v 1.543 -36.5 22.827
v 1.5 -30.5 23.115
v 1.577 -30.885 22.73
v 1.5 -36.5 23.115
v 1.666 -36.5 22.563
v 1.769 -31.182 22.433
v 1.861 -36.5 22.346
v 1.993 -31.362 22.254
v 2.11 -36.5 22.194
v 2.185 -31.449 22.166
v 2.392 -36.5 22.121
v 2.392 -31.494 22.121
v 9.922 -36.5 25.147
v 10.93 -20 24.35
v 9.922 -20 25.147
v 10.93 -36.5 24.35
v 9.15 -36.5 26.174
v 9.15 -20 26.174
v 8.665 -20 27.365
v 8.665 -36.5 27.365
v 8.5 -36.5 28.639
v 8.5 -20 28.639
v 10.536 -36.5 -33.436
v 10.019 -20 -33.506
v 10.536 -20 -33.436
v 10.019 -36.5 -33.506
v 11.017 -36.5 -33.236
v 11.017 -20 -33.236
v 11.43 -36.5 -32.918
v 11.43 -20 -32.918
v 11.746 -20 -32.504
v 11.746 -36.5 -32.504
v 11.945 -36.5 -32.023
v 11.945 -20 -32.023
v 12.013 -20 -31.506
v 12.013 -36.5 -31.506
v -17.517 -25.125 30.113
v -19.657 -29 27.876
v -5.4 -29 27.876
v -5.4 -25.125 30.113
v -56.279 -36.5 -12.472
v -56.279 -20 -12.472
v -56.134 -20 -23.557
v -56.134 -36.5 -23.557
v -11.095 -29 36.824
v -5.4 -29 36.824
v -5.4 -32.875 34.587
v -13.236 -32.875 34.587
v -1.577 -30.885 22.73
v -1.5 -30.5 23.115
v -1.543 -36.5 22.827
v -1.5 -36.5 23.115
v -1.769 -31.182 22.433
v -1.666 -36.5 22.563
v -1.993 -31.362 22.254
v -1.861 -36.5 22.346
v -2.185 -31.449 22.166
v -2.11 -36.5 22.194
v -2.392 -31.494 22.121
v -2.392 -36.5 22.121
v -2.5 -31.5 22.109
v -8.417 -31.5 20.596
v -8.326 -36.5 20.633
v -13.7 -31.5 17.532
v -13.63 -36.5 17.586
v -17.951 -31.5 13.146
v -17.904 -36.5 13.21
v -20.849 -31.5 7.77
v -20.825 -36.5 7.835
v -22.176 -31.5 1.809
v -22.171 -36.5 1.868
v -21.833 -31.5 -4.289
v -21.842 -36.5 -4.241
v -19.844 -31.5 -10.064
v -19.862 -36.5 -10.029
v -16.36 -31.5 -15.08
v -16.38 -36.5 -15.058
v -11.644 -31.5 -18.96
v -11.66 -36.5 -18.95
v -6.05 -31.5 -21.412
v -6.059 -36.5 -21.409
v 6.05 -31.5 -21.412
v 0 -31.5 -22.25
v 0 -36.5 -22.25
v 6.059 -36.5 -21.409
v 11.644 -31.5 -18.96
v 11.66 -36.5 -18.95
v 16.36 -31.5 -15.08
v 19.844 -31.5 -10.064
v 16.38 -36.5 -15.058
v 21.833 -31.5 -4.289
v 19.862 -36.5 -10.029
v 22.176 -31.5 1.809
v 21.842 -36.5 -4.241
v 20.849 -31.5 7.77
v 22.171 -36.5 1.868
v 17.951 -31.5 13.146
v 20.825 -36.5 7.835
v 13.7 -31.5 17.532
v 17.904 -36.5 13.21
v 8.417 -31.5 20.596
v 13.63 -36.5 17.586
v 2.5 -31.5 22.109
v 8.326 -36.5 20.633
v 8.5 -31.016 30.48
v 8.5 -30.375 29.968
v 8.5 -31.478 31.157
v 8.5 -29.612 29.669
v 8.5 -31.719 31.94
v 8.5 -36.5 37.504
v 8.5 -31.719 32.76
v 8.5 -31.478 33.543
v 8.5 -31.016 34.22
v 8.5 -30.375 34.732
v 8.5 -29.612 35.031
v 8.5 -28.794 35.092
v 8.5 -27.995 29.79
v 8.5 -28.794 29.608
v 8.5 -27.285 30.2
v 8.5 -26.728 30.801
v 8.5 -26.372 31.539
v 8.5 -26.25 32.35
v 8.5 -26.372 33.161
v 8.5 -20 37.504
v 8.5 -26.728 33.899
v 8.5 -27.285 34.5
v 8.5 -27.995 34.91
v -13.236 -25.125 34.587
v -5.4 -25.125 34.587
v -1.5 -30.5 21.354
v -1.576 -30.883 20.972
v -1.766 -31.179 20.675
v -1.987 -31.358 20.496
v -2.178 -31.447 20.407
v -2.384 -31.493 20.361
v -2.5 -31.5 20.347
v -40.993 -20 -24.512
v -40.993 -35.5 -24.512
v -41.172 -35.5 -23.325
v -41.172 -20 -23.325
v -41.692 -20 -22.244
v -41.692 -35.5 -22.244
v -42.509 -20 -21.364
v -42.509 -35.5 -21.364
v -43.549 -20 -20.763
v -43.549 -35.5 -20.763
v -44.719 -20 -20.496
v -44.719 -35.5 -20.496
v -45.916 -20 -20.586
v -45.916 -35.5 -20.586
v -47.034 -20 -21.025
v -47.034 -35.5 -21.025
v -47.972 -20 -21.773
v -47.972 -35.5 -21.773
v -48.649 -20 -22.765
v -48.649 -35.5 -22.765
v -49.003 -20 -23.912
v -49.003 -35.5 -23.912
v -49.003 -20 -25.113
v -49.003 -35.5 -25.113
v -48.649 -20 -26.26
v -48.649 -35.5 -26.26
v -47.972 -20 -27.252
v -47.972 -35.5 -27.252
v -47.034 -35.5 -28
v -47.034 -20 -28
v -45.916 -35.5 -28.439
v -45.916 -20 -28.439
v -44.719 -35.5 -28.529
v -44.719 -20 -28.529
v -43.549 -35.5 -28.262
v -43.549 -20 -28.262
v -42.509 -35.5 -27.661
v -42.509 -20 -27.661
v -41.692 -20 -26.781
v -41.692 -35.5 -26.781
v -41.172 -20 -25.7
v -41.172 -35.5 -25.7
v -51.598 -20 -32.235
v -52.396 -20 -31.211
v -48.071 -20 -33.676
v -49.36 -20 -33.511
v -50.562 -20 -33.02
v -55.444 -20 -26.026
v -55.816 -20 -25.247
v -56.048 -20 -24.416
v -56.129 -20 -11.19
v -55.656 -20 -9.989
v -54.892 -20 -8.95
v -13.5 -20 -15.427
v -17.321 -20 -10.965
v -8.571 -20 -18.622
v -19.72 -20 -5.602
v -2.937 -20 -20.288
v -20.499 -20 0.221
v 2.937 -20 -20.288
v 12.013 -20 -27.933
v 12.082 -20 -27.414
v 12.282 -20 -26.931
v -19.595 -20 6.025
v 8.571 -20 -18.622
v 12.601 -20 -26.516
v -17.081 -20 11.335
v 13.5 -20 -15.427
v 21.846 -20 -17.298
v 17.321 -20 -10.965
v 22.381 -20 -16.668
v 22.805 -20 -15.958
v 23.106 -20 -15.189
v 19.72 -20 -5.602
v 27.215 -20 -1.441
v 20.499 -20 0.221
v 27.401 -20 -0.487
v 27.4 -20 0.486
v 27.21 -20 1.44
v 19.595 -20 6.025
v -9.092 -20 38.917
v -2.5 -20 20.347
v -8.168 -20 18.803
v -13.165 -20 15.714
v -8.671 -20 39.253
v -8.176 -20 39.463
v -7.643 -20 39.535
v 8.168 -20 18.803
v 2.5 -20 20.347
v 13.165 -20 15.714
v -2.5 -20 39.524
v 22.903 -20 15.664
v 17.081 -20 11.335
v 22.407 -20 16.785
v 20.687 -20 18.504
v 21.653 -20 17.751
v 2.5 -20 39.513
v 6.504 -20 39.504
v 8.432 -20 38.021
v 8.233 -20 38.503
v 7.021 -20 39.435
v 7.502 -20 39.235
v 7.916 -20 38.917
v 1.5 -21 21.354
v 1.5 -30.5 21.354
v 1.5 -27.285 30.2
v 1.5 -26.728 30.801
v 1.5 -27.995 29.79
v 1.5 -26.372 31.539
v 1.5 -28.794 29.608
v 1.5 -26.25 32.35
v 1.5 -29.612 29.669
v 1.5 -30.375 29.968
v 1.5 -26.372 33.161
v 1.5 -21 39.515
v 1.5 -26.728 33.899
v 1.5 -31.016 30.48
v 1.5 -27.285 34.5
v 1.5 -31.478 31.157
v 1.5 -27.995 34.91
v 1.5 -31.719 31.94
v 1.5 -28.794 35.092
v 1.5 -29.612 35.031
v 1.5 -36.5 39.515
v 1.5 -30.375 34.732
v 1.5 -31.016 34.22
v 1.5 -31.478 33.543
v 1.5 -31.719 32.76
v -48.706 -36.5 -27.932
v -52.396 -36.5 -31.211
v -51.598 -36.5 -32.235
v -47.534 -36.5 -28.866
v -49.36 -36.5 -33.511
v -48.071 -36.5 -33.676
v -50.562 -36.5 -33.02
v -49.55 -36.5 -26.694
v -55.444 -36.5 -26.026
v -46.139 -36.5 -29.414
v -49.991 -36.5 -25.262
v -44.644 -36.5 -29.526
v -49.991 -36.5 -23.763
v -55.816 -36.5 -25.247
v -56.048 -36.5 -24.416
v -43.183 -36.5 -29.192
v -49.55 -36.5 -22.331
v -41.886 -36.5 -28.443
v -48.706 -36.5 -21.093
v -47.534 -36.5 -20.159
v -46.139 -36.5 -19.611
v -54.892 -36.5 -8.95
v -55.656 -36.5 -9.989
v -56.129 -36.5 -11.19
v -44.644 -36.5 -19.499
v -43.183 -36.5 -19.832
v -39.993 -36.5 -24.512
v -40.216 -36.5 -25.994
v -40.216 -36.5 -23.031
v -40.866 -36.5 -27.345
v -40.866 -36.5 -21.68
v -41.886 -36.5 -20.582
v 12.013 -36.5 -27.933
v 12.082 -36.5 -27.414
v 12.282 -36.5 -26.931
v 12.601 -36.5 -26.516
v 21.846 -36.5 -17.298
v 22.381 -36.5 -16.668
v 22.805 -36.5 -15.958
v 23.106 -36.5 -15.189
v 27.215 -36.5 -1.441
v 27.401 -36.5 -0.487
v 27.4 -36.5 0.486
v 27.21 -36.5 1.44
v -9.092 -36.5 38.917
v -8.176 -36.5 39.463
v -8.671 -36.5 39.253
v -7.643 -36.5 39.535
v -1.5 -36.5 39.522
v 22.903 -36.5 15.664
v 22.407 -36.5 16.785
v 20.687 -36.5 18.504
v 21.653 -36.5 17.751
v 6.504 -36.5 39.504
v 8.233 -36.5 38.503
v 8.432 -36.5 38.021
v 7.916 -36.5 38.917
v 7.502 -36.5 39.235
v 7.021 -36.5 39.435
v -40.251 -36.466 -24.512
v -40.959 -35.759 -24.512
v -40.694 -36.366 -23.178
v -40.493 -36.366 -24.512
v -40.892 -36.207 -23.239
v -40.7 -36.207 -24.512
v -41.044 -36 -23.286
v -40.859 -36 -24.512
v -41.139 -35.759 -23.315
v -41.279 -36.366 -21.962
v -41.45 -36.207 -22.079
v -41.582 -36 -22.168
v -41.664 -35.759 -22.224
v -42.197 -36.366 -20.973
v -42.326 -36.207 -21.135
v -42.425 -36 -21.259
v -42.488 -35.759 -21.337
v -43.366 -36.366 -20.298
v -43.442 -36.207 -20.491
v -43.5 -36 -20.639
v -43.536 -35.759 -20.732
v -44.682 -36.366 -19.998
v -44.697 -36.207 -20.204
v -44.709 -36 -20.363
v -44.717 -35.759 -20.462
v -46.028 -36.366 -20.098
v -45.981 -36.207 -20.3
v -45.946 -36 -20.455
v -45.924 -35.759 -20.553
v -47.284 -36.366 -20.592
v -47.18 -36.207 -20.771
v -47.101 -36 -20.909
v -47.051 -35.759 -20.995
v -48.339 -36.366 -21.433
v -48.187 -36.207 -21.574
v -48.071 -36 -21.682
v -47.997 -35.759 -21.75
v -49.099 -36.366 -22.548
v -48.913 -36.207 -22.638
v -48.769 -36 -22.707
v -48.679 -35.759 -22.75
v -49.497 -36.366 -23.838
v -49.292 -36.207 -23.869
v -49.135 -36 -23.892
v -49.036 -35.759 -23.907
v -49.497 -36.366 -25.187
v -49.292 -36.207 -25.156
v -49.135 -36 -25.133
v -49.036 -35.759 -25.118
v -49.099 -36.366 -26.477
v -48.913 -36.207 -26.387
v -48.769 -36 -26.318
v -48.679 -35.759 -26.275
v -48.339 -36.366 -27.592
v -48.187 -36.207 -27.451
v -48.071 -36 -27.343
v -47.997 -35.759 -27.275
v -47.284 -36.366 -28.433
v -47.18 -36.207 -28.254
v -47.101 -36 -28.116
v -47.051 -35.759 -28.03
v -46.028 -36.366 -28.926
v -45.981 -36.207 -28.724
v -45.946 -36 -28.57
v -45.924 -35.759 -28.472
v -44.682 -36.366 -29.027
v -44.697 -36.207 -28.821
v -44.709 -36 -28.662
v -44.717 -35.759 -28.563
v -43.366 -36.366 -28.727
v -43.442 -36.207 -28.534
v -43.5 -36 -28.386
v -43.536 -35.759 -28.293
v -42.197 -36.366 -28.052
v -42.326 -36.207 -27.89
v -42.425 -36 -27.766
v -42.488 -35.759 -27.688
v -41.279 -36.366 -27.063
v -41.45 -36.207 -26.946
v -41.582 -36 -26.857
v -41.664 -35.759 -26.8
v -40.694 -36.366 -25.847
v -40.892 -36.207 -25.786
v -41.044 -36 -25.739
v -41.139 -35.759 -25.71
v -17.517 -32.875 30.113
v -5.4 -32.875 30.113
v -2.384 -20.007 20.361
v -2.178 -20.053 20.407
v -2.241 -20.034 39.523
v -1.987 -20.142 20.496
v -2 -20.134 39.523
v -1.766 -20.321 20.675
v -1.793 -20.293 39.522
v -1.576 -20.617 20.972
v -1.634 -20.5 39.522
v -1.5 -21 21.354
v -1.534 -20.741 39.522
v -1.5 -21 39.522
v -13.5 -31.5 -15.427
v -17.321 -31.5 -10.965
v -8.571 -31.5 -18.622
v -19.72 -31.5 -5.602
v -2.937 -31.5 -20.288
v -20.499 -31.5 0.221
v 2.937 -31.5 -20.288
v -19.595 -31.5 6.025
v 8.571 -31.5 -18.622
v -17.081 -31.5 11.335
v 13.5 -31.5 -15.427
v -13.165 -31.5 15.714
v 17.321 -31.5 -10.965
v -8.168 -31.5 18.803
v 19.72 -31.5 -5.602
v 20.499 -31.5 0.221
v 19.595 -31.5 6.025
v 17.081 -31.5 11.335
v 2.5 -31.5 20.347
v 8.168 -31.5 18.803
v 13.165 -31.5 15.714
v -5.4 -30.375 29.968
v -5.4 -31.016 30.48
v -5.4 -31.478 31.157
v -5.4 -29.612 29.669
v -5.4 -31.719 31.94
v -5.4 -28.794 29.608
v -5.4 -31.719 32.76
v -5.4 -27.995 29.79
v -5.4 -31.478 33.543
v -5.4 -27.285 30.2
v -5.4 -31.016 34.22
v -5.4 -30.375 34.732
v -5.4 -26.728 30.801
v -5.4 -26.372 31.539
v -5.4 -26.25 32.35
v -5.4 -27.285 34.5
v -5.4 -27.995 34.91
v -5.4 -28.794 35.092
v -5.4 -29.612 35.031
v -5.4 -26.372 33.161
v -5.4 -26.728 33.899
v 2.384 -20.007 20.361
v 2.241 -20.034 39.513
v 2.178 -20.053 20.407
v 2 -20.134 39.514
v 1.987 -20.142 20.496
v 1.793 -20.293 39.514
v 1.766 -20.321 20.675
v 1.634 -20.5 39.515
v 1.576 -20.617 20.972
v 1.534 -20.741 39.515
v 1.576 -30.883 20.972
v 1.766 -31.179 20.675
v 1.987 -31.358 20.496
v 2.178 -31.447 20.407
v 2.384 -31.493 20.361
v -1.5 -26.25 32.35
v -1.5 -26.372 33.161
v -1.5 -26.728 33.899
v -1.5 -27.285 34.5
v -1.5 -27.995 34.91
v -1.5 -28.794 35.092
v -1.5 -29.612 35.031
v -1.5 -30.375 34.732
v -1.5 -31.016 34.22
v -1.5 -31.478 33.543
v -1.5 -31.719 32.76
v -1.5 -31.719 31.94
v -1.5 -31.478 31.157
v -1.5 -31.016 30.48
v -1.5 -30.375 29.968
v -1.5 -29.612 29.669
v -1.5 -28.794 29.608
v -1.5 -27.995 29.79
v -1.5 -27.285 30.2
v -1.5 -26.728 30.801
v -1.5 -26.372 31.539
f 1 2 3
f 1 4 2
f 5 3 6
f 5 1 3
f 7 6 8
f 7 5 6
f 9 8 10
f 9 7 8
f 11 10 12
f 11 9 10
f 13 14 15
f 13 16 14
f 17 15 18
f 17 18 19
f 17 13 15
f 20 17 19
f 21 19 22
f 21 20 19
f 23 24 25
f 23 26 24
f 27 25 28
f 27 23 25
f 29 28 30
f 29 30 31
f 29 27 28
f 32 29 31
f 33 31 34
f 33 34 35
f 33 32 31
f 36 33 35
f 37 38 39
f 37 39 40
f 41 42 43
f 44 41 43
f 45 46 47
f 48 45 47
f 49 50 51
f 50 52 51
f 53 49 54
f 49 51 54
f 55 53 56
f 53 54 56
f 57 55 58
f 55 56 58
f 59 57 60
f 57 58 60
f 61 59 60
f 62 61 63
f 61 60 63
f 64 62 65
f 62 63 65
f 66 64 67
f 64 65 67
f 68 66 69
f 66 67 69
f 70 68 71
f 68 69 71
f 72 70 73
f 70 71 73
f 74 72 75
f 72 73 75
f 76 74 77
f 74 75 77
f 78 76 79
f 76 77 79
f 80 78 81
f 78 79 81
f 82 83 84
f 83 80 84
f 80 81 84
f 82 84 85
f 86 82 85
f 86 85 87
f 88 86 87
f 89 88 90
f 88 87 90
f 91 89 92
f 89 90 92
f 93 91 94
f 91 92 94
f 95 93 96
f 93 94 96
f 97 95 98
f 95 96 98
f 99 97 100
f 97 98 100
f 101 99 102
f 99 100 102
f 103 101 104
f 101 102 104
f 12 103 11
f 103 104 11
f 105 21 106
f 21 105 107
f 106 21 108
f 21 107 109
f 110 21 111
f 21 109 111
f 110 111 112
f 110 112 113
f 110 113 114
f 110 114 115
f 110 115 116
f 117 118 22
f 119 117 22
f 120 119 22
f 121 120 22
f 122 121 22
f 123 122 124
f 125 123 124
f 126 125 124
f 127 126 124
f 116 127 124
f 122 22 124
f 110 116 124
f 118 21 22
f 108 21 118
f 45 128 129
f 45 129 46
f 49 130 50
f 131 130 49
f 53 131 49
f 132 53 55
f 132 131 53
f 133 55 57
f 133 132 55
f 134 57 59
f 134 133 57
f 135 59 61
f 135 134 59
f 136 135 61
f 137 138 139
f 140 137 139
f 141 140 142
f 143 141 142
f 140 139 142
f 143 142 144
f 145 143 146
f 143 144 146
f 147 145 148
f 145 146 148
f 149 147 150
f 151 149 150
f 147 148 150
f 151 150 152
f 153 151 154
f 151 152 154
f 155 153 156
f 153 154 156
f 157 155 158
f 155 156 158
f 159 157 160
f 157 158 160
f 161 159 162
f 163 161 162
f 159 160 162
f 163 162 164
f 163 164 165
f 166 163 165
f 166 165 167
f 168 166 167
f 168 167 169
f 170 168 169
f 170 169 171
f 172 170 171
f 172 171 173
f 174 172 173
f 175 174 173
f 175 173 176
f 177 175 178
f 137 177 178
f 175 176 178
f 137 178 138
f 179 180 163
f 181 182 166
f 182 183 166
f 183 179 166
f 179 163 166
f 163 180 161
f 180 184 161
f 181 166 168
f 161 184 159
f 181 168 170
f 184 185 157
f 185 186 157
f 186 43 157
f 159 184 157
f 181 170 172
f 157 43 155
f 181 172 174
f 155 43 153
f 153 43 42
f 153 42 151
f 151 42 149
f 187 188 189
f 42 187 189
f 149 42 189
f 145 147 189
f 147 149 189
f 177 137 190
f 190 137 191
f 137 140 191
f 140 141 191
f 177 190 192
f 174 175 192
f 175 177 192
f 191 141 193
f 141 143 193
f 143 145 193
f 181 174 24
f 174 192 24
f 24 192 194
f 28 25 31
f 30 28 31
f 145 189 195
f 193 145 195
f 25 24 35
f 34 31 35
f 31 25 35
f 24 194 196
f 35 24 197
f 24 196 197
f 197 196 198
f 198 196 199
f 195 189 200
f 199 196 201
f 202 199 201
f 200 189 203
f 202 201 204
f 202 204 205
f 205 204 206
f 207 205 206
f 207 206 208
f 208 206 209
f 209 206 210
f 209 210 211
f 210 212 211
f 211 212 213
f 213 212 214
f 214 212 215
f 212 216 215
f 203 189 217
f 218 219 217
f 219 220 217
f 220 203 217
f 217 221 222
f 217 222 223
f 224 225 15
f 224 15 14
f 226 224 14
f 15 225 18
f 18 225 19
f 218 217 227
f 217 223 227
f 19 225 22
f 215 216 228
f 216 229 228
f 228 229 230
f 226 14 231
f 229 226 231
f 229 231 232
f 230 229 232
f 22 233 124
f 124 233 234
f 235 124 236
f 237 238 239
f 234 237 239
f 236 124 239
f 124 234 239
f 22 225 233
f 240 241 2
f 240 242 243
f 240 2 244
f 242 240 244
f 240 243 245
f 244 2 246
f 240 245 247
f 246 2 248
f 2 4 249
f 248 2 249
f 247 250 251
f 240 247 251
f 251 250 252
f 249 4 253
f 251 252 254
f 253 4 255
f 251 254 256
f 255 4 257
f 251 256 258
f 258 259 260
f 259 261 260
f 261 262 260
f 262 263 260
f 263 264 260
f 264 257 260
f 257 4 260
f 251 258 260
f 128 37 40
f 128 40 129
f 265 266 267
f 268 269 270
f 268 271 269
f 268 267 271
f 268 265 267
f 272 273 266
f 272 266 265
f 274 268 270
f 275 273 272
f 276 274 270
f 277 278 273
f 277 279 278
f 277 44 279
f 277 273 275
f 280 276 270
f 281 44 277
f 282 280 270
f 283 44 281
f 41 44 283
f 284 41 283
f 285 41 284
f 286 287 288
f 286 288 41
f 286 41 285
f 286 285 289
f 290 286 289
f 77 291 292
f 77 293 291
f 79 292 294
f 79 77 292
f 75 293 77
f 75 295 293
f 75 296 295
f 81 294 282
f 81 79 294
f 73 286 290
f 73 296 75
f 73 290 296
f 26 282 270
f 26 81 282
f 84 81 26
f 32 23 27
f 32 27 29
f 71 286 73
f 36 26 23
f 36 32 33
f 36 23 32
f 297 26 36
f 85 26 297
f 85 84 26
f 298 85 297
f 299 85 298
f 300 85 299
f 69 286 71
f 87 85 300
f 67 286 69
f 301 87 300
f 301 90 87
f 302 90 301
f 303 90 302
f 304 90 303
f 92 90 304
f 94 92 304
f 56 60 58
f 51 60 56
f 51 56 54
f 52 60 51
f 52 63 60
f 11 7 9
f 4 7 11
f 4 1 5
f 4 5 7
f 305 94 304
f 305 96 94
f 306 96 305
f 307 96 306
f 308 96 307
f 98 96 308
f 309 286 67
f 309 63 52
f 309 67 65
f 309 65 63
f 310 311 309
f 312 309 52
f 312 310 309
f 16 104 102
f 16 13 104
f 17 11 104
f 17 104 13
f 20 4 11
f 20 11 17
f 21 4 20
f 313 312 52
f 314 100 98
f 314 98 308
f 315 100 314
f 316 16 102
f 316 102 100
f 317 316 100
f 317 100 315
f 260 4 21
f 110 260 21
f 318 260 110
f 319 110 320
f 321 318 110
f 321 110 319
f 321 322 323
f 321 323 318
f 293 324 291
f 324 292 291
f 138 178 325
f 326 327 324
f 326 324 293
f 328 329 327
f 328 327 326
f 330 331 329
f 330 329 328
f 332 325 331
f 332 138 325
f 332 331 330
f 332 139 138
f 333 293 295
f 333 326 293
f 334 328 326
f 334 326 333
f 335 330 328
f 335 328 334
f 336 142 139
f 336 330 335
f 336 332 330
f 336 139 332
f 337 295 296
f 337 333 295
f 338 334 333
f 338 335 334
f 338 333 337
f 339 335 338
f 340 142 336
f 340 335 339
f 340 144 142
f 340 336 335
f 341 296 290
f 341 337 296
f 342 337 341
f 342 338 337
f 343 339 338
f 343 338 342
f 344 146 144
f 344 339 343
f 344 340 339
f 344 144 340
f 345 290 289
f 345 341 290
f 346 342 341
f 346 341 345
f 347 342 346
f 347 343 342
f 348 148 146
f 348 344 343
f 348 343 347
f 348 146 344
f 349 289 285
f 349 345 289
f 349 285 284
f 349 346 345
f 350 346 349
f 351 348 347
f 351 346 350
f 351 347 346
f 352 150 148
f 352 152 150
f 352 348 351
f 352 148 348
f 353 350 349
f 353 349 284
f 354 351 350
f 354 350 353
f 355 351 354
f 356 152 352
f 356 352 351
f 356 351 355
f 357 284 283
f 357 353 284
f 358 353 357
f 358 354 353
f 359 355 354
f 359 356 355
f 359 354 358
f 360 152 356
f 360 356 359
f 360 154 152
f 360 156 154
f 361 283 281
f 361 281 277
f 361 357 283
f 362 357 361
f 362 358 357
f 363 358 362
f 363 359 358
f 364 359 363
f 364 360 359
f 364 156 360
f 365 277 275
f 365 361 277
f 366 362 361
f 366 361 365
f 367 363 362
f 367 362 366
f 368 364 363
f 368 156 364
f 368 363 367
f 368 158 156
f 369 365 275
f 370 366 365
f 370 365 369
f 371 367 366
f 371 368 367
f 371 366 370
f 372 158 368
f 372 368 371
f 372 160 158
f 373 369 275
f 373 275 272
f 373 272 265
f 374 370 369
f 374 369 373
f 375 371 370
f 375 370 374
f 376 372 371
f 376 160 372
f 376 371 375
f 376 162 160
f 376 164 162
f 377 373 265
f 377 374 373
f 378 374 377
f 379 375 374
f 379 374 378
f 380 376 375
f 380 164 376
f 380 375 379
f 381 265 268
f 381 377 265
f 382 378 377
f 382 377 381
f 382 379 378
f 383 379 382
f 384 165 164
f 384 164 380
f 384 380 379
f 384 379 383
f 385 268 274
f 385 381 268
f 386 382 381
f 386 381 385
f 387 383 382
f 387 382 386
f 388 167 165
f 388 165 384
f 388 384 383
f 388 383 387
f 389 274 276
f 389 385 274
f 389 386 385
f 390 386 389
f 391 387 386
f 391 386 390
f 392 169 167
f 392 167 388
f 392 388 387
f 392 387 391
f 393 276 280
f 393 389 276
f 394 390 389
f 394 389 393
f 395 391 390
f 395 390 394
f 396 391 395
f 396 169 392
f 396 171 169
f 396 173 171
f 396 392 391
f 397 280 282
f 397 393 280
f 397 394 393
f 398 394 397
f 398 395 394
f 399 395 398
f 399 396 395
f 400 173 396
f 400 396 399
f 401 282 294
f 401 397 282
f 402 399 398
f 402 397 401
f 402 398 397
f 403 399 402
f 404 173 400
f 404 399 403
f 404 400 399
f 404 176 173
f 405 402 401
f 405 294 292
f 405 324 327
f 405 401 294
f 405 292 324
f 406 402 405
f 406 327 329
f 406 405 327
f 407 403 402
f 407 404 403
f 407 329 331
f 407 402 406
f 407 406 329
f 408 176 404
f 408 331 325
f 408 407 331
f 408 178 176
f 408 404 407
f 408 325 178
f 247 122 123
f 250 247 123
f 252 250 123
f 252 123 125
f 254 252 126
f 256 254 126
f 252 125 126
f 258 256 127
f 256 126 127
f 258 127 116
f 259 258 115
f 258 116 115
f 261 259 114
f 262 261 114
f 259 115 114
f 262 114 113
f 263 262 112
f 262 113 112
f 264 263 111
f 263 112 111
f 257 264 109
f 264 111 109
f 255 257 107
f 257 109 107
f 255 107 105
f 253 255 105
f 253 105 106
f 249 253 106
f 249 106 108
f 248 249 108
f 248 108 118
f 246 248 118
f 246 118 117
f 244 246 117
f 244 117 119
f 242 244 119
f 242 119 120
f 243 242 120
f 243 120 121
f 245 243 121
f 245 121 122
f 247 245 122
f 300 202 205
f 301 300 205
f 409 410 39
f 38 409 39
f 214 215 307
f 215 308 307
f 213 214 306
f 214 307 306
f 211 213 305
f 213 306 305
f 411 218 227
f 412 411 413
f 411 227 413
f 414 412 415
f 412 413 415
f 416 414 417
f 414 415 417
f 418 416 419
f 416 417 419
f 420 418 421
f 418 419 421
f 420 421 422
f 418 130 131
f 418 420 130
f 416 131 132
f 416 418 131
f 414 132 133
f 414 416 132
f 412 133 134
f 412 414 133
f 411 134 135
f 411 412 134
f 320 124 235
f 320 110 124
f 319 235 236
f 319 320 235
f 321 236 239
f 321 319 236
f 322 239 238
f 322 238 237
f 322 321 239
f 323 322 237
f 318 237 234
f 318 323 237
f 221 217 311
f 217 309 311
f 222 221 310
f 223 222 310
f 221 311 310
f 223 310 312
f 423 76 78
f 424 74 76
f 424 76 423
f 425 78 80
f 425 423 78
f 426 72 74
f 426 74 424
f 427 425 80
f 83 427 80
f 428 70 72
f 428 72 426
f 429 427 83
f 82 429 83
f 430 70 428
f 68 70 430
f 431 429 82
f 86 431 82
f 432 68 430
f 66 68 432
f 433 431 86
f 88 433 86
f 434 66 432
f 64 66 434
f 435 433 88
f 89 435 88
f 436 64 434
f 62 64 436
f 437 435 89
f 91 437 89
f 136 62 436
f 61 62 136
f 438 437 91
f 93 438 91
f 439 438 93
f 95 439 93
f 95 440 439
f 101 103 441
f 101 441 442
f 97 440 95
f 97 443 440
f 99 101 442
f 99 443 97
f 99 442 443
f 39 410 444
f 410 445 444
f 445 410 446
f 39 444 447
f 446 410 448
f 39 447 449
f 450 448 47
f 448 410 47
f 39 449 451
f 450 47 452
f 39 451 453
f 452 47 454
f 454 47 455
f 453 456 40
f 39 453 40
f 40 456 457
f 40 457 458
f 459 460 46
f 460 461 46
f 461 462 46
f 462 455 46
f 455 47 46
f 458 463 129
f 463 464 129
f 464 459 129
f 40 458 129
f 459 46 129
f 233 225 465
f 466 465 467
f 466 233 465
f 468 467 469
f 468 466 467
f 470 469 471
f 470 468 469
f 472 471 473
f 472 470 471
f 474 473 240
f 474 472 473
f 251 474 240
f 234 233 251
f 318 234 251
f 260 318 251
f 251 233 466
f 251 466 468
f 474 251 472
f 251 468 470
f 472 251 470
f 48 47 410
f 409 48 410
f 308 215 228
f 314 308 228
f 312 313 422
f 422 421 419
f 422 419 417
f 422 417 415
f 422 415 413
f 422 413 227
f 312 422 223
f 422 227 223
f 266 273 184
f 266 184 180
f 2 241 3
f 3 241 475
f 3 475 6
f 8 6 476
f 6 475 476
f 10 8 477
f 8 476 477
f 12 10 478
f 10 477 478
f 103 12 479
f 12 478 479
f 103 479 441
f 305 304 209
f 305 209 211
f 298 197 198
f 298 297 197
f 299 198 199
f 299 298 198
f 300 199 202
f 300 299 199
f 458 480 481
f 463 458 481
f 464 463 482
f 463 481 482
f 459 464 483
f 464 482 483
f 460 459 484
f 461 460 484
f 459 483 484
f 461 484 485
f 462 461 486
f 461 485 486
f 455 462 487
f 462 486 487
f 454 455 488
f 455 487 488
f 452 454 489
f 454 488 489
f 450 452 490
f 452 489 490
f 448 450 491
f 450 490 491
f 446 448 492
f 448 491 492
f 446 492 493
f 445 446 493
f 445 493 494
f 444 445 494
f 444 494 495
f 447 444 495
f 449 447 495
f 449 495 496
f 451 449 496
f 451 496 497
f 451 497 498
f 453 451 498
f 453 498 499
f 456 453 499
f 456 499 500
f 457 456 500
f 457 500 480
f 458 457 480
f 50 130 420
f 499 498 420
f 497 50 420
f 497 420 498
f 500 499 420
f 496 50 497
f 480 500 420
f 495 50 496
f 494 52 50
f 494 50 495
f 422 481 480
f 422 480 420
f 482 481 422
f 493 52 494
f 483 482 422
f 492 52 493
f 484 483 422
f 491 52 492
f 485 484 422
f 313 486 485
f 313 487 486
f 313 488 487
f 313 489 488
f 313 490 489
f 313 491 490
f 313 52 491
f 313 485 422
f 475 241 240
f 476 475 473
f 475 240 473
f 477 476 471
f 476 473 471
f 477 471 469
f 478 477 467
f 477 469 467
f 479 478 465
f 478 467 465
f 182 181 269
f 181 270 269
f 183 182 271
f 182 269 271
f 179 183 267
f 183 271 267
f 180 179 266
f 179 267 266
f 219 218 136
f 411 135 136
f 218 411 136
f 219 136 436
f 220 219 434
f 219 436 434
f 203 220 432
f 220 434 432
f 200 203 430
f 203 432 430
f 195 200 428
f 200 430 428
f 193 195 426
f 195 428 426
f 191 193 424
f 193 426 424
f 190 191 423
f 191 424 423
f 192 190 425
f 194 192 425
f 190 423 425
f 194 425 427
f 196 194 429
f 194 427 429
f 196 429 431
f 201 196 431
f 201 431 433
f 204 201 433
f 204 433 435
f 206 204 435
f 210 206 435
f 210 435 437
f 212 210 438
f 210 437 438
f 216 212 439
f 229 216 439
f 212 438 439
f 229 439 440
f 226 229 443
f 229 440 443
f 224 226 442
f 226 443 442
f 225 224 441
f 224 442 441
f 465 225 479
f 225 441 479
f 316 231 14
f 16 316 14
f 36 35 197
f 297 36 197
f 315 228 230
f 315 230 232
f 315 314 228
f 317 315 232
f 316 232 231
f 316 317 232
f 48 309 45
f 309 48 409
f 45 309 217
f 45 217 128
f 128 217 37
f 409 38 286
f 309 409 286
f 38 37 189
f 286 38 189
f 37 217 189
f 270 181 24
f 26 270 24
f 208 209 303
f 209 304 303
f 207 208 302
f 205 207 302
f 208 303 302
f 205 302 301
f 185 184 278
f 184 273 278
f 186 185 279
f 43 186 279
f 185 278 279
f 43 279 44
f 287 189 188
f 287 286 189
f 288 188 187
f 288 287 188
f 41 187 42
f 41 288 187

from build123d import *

# Parameters (mm, degrees)
F15_DEPTH = 16.5
F16_R     = 20.5
F17_DEPTH = 16.5
F18_R     = 4.0274870607
F19_DEPTH = 16.5
F20_W     = 3
F20_H     = 20
F21_DEPTH = 16.5
F22_R     = 2.75
F23_DEPTH = 40
F26_DEPTH = 31.3
F27_R     = 22.25
F28_DEPTH = 5
F29_R     = 1
F30_R     = 5
F31_R     = 5
F32_R     = 5
F33_R     = 5
F34_R     = 5
F35_R     = 2
F36_R     = 2


# Not quite as in the source:
# - a feature of the source that left no trace in its solid (it failed there, or was rolled back) is left out


with BuildPart() as f15:
    # F14 (on offset) → F15 (new body)
    with BuildSketch(Plane.XZ.offset(20)):
        Polygon((8.5, 39.5), (-8.5, 39.5365608335), (-56.3052967191, -10.4271536693), (-56.1165139079, -24.8827897012), (-50.9412027895, -33.6846895516), (12.0133129929, -33.5), (12.0133129929, -27.1025877446), (22.7434113622, -16.4029654115), (27.6456046849, 0), (22.3432332277, 17.5122059882), (8.5, 25.806048885), align=None)
    extrude(amount=F15_DEPTH)

    # F16 (on face) → F17 (cut)
    with BuildSketch(Plane.XZ.offset(36.5)):
        Circle(F16_R)
    extrude(amount=-F17_DEPTH, mode=Mode.SUBTRACT)

    # F18 (on face) → F19 (cut)
    with BuildSketch(Plane.XZ.offset(36.5)):
        with Locations((-45.0200997293, -24.5124399662)):
            Circle(F18_R)
    extrude(amount=-F19_DEPTH, mode=Mode.SUBTRACT)

    # F20 (on face) → F21 (cut)
    with BuildSketch(Plane.XZ.offset(36.5)):
        with Locations((0, 30.4450483003)):
            Rectangle(F20_W, F20_H)
    extrude(amount=-F21_DEPTH, mode=Mode.SUBTRACT)

    # F22 (on face) → F23 (cut)
    with BuildSketch(Plane.YZ.offset(8.5)):
        with Locations((-29, 32.35)):
            Circle(F22_R)
    extrude(amount=-F23_DEPTH, mode=Mode.SUBTRACT)

    # F25 (on offset) → F26 (cut)
    with BuildSketch(Plane.YZ.offset(-36.7)):
        Polygon((-32.875, 34.5872322931), (-32.875, 30.1127677069), (-29, 27.8755354138), (-25.125, 30.1127677069), (-25.125, 34.5872322931), (-29, 36.8244645862), align=None)
    extrude(amount=F26_DEPTH, mode=Mode.SUBTRACT)

    # F27 (on face) → F28 (cut)
    with BuildSketch(Plane.XZ.offset(36.5)):
        Circle(F27_R)
    extrude(amount=-F28_DEPTH, mode=Mode.SUBTRACT)

    # F29
    f29_edges = [f15.edges().sort_by_distance(p)[0] for p in [
        (-49.047587, -36.5, -24.51244),
        (-1.5, -20, 29.983277),
        (1.5, -20, 29.980051),
        (-1.5, -34, 22.199381),
        (-1.5, -31.5, 21.322214),
        (-1.5, -25.75, 20.445048),
        (1.5, -25.75, 20.445048),
        (1.5, -31.5, 21.322214),
        (1.5, -34, 22.199381),
    ]]
    fillet(f29_edges, radius=F29_R)

    # F30
    f30_edges = [f15.edges().sort_by_distance(p)[0] for p in [
        (27.645605, -28.25, 0),
    ]]
    fillet(f30_edges, radius=F30_R)

    # F31
    f31_edges = [f15.edges().sort_by_distance(p)[0] for p in [
        (22.343233, -28.25, 17.512206),
    ]]
    fillet(f31_edges, radius=F31_R)

    # F32
    f32_edges = [f15.edges().sort_by_distance(p)[0] for p in [
        (22.743411, -28.25, -16.402965),
    ]]
    fillet(f32_edges, radius=F32_R)

    # F33
    f33_edges = [f15.edges().sort_by_distance(p)[0] for p in [
        (8.5, -28.25, 25.806049),
    ]]
    fillet(f33_edges, radius=F33_R)

    # F34
    f34_edges = [f15.edges().sort_by_distance(p)[0] for p in [
        (-50.941203, -28.25, -33.68469),
        (-56.116514, -28.25, -24.88279),
        (-56.305297, -28.25, -10.427154),
    ]]
    fillet(f34_edges, radius=F34_R)

    # F35
    f35_edges = [f15.edges().sort_by_distance(p)[0] for p in [
        (12.013313, -28.25, -33.5),
        (12.013313, -28.25, -27.102588),
    ]]
    fillet(f35_edges, radius=F35_R)

    # F36
    f36_edges = [f15.edges().sort_by_distance(p)[0] for p in [
        (-8.5, -28.25, 39.536561),
        (8.5, -28.25, 39.5),
    ]]
    fillet(f36_edges, radius=F36_R)


solid = f15.part
